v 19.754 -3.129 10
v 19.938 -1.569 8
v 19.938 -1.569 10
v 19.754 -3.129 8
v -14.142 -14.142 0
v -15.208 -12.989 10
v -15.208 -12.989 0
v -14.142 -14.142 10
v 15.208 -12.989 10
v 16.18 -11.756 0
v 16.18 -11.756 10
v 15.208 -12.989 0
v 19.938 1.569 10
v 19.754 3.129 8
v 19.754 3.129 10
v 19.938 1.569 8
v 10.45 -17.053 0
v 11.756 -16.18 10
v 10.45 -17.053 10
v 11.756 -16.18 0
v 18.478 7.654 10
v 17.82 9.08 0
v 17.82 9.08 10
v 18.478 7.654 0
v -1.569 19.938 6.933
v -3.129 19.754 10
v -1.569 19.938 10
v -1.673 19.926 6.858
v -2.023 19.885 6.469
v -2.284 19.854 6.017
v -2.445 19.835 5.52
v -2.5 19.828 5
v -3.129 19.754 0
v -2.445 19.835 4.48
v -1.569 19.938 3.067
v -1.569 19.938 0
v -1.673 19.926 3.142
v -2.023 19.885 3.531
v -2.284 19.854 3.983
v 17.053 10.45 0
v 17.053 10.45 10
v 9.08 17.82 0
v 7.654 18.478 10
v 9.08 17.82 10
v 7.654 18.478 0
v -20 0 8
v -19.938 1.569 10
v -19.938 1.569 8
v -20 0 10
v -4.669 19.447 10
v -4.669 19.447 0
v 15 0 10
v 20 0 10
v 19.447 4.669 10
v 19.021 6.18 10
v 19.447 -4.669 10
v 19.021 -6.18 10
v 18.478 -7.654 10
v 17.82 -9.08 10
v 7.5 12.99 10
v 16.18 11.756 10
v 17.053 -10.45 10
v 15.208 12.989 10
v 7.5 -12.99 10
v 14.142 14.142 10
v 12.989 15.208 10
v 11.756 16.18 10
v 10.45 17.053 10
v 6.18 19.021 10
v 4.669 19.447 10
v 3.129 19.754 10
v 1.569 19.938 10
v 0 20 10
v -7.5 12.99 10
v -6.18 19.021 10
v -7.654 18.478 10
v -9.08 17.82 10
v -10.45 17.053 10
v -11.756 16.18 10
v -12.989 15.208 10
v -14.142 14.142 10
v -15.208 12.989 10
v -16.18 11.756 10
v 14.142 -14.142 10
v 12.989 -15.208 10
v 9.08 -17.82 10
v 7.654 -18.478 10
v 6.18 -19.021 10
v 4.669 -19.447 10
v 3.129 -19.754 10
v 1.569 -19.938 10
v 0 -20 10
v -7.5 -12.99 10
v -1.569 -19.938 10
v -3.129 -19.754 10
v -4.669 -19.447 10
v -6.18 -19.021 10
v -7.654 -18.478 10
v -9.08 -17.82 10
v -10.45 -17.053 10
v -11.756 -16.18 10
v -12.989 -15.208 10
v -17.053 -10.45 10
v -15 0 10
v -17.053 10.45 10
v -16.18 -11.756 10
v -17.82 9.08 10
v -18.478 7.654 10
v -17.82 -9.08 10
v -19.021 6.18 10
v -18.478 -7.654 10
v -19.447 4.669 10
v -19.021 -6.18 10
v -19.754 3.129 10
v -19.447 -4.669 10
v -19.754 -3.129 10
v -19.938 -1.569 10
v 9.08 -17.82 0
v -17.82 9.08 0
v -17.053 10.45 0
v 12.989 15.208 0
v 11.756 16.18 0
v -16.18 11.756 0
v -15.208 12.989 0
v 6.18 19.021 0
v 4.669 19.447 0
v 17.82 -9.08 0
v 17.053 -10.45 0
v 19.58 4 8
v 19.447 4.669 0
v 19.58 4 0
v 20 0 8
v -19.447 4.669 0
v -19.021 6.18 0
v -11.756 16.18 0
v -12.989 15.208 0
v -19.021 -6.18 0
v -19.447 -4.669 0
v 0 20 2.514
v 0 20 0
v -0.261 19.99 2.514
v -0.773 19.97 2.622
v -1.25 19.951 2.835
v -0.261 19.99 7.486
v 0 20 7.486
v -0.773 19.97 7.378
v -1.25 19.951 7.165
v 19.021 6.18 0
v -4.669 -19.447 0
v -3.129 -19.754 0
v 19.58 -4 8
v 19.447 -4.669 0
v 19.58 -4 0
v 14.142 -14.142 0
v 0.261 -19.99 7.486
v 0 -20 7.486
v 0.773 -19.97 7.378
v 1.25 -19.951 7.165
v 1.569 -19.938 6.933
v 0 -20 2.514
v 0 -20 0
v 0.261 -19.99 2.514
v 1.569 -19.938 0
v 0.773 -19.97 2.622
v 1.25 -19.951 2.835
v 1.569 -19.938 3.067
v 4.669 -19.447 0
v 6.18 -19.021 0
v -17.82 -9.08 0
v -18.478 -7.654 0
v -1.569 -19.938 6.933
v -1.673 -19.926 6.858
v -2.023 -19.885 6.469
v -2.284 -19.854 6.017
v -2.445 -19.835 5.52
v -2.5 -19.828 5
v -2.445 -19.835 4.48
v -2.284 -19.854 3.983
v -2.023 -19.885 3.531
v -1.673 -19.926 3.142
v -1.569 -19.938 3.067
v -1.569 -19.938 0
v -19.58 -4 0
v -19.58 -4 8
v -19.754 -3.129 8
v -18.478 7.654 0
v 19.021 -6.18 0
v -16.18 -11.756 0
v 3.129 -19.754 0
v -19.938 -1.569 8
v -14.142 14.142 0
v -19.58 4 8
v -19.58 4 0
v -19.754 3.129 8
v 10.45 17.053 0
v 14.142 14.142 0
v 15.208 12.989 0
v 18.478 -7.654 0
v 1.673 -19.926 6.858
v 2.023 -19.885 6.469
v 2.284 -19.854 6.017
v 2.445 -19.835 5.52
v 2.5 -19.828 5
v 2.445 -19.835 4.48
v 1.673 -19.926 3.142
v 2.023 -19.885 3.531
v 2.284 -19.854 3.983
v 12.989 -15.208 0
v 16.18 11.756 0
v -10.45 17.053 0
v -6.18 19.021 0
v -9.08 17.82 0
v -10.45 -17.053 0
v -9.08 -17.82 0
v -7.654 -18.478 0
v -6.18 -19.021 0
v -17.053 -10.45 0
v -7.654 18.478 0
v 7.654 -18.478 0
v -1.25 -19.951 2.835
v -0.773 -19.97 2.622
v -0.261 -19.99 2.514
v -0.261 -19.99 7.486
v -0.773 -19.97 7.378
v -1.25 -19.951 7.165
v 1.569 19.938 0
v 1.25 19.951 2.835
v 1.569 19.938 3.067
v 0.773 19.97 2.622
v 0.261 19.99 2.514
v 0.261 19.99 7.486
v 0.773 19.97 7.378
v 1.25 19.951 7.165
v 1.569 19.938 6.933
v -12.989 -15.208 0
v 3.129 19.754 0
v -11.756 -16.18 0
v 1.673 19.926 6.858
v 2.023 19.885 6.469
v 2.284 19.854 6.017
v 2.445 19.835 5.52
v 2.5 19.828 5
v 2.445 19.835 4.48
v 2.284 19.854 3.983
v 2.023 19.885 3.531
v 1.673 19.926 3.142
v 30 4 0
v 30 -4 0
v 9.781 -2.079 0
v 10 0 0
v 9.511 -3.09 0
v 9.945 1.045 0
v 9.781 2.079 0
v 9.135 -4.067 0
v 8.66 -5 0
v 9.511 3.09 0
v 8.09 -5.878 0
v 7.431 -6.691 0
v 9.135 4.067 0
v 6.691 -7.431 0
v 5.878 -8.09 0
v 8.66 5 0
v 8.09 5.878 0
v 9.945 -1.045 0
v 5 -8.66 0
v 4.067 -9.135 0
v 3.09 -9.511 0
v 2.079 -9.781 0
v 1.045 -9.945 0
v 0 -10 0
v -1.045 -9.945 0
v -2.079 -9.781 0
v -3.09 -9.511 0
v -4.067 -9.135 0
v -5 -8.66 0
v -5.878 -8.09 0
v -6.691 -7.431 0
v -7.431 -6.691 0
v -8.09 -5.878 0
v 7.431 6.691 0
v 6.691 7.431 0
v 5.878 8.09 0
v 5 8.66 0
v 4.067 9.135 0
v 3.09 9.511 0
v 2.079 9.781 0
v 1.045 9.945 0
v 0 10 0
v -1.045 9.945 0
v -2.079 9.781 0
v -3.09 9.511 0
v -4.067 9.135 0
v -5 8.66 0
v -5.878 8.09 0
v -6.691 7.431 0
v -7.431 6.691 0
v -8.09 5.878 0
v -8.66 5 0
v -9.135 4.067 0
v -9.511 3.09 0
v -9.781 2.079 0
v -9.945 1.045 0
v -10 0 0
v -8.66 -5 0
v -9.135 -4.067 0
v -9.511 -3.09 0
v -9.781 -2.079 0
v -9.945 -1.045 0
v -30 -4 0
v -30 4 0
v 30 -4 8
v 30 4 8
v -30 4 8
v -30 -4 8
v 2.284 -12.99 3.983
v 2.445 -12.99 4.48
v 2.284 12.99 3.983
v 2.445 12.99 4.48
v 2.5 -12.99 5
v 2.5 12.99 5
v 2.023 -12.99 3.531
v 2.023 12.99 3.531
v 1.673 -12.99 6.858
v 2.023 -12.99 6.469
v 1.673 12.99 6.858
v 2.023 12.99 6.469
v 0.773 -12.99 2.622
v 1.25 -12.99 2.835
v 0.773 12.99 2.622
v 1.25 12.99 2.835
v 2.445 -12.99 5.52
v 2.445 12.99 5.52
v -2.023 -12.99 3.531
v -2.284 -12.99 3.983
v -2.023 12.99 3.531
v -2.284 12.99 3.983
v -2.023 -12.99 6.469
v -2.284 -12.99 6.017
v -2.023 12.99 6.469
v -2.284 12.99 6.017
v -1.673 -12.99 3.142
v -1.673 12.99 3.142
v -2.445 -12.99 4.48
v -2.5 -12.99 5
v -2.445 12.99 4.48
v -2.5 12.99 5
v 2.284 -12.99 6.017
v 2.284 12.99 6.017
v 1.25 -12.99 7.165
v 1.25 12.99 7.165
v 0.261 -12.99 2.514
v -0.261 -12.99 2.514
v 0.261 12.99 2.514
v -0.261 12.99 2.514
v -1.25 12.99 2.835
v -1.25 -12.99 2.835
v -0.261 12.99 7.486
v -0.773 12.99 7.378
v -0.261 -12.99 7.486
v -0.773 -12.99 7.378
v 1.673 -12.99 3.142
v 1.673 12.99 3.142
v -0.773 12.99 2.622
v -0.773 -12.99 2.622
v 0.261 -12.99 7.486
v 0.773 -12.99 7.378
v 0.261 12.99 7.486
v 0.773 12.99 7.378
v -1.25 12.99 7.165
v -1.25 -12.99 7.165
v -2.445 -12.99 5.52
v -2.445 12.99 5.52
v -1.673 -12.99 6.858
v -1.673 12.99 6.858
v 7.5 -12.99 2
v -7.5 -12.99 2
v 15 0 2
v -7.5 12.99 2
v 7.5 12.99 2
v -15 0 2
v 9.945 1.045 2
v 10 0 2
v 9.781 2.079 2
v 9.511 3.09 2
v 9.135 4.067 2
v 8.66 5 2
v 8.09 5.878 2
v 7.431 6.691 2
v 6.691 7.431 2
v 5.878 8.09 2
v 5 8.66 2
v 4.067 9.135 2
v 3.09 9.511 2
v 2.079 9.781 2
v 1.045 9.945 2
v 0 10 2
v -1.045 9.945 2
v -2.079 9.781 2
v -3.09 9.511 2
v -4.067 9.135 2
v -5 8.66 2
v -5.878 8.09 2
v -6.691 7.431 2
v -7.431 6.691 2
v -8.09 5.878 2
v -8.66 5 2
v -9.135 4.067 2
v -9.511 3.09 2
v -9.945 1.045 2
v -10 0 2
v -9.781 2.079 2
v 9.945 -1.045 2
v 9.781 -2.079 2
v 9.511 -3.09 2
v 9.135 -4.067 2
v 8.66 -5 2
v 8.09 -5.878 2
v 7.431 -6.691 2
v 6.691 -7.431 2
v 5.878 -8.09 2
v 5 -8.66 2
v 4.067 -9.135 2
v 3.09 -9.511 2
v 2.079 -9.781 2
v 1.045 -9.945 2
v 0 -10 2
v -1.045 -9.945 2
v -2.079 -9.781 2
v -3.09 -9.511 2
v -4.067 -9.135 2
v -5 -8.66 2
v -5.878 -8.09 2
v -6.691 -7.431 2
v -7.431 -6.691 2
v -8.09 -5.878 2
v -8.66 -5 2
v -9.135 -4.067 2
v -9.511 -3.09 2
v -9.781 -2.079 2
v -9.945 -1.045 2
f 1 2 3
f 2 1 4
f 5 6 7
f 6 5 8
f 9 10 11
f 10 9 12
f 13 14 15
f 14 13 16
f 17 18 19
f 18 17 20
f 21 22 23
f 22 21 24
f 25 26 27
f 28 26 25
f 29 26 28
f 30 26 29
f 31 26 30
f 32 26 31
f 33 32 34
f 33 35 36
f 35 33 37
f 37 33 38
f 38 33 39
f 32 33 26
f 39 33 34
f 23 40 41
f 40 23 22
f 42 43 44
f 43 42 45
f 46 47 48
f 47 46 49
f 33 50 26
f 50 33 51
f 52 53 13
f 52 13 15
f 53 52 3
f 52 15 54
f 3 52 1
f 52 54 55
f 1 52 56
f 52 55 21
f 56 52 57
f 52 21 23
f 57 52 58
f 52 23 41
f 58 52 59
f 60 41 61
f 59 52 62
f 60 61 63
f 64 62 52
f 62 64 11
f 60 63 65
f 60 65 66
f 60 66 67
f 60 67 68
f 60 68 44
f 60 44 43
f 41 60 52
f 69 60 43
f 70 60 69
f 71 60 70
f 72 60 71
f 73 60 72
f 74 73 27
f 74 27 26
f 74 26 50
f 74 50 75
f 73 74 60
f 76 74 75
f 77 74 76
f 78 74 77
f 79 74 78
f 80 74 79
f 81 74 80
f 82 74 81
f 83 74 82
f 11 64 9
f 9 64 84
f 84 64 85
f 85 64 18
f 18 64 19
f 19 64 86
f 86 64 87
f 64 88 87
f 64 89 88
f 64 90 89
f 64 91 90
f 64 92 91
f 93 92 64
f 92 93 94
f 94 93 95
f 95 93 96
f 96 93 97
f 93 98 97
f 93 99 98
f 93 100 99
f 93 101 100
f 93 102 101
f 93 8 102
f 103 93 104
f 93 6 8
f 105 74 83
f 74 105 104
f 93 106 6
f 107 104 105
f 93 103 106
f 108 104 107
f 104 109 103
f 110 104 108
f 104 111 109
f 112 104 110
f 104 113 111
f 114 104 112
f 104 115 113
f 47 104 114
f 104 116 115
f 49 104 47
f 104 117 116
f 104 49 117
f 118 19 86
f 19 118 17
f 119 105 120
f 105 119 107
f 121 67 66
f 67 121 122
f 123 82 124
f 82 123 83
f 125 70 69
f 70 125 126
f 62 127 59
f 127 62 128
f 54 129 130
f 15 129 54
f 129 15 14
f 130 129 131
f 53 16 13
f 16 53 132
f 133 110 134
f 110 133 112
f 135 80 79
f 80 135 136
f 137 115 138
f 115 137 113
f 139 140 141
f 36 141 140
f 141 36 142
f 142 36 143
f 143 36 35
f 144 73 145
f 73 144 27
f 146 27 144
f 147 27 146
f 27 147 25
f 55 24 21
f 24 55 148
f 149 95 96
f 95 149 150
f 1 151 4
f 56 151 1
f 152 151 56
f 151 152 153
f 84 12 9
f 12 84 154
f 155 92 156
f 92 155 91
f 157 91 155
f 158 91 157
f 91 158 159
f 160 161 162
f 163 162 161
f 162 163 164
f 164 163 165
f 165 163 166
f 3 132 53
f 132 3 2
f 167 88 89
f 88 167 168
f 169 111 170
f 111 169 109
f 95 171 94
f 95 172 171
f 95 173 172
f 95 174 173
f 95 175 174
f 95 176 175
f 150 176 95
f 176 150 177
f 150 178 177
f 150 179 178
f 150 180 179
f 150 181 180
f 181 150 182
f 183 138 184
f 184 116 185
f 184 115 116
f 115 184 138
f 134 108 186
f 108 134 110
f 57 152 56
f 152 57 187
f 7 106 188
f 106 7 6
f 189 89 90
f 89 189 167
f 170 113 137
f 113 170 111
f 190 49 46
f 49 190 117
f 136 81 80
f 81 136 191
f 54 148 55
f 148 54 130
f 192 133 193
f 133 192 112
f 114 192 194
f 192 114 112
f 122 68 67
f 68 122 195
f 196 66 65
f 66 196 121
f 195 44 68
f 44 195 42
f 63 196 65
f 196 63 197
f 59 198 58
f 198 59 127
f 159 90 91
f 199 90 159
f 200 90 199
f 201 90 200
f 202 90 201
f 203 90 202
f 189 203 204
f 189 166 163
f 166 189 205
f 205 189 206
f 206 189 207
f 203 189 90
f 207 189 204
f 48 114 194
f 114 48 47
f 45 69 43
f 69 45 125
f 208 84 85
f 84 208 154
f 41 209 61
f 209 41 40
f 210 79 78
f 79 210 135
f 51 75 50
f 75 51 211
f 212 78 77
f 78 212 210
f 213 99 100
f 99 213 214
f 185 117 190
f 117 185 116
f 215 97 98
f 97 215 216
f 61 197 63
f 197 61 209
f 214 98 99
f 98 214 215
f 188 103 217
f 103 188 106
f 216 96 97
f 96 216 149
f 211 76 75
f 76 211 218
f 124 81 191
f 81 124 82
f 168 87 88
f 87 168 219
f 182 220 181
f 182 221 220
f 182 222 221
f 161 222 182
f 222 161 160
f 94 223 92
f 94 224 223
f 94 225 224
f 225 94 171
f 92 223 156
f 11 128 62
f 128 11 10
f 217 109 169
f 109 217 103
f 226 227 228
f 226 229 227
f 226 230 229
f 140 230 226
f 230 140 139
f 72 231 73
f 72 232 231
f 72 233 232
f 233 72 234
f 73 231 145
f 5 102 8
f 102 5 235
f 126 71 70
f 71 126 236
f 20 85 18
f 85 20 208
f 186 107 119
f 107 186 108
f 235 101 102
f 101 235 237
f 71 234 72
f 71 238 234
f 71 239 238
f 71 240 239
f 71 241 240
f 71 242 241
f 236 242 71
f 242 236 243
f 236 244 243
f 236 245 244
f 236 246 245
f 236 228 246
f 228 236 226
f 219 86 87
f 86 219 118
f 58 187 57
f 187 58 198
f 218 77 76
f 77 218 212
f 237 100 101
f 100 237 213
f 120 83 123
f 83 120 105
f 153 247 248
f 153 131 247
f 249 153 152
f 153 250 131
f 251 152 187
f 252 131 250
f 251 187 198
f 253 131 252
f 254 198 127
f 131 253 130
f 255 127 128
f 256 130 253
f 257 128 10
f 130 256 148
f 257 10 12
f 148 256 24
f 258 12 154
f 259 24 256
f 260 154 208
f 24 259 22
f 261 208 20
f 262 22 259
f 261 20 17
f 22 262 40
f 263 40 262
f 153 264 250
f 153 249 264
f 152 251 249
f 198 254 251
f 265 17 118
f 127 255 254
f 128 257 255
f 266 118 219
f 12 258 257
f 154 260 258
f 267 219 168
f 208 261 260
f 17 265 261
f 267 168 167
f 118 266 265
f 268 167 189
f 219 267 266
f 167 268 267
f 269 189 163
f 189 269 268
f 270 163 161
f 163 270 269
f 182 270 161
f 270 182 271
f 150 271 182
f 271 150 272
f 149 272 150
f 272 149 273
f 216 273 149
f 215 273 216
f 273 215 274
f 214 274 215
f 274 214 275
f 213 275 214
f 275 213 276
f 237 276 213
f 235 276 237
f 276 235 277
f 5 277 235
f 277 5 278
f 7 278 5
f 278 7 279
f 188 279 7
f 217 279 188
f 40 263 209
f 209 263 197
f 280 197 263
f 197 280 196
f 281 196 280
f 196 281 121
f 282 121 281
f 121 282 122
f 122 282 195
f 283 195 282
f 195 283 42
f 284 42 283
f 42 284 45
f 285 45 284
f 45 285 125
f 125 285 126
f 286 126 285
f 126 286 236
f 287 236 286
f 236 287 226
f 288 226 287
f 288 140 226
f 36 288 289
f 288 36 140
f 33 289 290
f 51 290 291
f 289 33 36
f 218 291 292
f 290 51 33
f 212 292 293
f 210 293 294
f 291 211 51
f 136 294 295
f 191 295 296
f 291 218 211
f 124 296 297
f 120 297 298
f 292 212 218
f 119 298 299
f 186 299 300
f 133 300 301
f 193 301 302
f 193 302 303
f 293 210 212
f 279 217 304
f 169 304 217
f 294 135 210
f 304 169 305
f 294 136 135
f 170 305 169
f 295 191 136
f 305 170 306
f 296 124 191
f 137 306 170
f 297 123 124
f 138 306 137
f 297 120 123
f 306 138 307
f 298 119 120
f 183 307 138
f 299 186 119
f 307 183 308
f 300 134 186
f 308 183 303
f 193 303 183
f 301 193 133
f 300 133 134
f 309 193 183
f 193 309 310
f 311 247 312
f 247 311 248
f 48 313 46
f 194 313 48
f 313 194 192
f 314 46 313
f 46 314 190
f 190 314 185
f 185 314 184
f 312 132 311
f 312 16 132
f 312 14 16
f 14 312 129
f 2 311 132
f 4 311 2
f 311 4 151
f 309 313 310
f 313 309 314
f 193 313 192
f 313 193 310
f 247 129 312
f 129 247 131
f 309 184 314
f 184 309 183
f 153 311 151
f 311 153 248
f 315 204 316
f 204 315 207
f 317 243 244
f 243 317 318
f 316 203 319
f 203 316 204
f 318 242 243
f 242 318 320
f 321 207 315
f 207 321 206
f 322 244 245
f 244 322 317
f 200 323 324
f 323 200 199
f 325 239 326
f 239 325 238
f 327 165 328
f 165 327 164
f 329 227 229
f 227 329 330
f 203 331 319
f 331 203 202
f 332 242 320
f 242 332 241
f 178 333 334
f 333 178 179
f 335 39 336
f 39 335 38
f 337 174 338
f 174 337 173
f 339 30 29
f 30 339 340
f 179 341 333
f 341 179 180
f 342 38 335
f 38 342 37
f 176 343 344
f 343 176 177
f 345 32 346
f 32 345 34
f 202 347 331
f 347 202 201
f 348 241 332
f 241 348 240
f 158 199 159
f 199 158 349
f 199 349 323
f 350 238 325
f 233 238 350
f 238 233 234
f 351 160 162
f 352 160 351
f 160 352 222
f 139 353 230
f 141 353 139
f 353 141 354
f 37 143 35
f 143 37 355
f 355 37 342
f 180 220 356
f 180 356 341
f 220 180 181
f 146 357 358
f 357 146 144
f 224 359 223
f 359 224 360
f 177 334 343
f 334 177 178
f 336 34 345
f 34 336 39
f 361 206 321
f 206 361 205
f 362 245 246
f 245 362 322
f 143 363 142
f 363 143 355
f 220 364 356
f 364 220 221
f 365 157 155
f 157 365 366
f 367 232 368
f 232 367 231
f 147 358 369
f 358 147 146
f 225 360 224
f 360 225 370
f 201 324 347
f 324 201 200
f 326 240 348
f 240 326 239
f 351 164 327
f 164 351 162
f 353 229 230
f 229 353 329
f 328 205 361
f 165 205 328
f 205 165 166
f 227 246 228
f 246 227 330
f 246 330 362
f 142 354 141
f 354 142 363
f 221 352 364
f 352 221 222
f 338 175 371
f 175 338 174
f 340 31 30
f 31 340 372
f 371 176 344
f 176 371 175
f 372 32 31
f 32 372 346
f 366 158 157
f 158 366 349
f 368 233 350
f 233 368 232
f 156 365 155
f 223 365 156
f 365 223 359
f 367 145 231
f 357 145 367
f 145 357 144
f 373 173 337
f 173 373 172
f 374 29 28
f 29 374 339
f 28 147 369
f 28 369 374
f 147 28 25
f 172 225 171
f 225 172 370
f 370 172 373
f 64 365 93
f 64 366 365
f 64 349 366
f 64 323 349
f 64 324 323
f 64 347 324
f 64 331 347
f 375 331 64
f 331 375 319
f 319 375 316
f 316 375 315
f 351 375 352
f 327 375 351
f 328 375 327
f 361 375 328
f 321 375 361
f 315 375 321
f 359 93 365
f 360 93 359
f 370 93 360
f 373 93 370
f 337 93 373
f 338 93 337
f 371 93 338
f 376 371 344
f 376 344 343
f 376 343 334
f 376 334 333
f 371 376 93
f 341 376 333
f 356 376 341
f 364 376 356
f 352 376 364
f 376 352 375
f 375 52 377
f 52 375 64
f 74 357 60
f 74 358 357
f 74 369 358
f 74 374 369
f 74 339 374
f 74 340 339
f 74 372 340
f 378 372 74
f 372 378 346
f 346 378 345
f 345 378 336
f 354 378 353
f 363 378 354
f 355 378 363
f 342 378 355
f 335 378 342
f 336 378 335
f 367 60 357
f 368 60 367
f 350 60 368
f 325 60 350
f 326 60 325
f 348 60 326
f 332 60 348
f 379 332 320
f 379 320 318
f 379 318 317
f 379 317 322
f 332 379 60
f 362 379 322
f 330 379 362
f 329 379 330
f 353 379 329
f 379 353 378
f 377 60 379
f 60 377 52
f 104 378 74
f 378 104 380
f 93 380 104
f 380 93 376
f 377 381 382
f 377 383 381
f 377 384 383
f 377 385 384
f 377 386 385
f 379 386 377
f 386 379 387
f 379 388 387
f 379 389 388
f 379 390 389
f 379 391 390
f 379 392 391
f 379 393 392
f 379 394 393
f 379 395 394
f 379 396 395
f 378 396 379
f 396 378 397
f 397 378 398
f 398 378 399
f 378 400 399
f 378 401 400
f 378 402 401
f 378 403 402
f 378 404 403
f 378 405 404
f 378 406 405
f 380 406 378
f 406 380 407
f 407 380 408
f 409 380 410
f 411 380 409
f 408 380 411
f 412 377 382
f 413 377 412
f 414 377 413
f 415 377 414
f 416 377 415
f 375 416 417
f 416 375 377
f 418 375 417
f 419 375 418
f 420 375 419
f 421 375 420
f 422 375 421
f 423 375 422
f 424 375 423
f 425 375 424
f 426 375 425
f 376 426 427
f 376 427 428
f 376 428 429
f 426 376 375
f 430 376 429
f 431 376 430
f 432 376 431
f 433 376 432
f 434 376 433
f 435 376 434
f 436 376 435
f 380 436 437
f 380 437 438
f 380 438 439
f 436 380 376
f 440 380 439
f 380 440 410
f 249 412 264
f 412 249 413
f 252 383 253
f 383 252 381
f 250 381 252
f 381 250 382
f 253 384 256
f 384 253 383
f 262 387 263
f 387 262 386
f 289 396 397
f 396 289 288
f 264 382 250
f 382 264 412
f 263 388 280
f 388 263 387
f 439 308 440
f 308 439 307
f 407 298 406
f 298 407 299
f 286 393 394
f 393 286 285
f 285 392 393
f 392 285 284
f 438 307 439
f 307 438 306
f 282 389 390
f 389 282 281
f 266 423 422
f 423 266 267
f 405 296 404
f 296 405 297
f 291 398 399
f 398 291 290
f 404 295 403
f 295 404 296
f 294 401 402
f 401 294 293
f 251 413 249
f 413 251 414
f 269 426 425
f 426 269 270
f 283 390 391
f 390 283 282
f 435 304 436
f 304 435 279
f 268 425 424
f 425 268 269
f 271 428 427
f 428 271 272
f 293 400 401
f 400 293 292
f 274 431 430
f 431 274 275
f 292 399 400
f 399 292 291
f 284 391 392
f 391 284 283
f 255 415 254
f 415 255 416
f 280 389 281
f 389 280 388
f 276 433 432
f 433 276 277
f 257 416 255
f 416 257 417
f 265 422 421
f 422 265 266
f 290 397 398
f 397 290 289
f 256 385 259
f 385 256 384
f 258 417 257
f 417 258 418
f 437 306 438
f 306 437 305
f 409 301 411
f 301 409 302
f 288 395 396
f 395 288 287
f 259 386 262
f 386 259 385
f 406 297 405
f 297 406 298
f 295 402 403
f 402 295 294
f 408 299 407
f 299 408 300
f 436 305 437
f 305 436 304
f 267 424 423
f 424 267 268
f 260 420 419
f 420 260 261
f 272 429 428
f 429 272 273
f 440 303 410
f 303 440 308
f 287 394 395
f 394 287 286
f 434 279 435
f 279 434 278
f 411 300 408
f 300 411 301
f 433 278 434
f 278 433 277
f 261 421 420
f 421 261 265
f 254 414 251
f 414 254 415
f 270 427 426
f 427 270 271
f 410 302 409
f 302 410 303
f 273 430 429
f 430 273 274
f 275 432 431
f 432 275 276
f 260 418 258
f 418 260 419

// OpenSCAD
difference() {
  union() {
    cylinder(d=40,h=10,$fn=80);
    translate([-30,-4]) cube([60,8,8]);
  }
  translate([0,-50,5]) rotate([-90,0]) cylinder(d=5,h=100,$fn=30);
  translate([0,0,2]) cylinder(d=30,h=10.02,$fn=6);
  translate([0,0,-.01]) cylinder(d=20,h=2.02,$fn=60);
}
